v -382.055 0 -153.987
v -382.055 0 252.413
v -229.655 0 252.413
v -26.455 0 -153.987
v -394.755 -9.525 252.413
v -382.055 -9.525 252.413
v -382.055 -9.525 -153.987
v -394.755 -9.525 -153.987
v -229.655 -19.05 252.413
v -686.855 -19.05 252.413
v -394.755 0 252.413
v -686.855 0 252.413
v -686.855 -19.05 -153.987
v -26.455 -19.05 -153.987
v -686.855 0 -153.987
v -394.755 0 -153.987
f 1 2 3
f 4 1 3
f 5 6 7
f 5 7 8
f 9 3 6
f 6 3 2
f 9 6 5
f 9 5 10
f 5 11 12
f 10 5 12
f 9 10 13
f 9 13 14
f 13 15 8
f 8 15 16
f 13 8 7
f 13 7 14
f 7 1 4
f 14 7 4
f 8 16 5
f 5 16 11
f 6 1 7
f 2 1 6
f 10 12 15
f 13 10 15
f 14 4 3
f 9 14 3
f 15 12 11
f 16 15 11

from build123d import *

# Parameters (mm, degrees)
F1_DEPTH = 19.05
F2_W     = 12.7
F2_H     = 406.4
F3_DEPTH = 9.525


# Not quite as in the source:
# - a feature names something its author has since deleted; it is built from what else it names


with BuildPart() as f1:
    # F0 (on Front) → F1 (new body)
    with BuildSketch(Plane.XZ):
        Polygon((-229.6549332498, 252.4134865394), (-356.6549332498, 252.4134865394), (-686.8549332498, 252.4134865394), (-686.8549332498, -153.9865134606), (-356.6549332498, -153.9865134606), (-26.4549332498, -153.9865134606), align=None)
    extrude(amount=F1_DEPTH)

    # F2 (on face) → F3 (cut)
    with BuildSketch(Plane(origin=(0, 0, 0), x_dir=(-1, 0, 0), z_dir=(0, 1, 0))):
        with Locations((388.4049332498, 49.2134865394)):
            Rectangle(F2_W, F2_H)
    extrude(amount=-F3_DEPTH, mode=Mode.SUBTRACT)


solid = f1.part
